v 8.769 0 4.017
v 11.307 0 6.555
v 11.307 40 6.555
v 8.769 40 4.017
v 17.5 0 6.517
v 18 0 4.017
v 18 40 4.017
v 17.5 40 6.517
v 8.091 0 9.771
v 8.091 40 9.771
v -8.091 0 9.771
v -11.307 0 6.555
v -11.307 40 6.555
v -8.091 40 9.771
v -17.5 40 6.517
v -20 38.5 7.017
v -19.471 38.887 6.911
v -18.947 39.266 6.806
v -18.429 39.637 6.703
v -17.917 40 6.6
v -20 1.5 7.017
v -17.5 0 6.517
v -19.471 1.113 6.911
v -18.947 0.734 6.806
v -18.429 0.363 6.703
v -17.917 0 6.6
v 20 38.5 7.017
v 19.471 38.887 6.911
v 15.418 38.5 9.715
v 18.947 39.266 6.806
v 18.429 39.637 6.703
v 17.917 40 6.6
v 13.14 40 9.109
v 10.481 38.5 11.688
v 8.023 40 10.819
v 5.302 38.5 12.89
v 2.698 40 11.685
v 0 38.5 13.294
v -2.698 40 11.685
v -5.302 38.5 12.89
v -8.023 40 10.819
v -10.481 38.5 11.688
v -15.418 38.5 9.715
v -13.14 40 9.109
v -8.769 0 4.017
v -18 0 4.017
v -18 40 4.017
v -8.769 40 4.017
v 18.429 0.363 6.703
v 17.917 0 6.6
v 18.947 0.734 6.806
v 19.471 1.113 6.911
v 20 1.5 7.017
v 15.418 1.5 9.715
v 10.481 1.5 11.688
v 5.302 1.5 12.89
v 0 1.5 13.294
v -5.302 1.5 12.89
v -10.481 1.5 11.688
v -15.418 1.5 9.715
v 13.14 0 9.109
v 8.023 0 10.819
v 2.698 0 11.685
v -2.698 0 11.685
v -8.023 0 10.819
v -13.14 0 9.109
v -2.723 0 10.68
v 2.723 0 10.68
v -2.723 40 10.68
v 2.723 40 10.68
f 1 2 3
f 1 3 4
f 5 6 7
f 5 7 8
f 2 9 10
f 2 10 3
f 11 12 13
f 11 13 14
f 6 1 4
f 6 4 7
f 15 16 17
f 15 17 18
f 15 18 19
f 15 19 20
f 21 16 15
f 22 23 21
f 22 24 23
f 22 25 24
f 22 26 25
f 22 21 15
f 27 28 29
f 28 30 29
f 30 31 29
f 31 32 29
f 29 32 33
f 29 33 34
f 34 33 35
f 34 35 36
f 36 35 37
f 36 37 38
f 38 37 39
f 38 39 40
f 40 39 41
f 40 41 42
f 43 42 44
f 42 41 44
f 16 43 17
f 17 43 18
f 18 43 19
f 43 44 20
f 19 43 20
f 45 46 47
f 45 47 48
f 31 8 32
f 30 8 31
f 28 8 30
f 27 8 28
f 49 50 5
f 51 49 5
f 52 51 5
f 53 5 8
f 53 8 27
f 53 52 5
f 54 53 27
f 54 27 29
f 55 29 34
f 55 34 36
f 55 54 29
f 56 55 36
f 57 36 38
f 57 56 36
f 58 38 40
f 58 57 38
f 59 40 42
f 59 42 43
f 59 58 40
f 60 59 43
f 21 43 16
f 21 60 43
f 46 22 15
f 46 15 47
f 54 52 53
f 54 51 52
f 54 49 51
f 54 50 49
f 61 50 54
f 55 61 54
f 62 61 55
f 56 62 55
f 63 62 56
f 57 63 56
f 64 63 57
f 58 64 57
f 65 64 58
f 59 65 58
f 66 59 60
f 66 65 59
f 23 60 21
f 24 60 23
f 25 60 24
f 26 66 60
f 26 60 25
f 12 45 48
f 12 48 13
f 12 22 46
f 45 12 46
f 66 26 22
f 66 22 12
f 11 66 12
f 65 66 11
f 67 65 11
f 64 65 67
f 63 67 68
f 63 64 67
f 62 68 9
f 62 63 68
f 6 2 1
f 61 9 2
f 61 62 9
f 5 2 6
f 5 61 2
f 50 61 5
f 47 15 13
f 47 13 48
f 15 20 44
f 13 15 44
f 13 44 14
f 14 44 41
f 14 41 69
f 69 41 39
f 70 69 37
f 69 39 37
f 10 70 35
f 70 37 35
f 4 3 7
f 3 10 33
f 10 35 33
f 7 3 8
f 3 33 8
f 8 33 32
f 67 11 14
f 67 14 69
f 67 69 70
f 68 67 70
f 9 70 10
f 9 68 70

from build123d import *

# Parameters (mm, degrees)
F1_DEPTH = 40
F2_SIZE  = 1.5


with BuildPart() as f1:
    # F0 (on Front) → F1 (new body)
    with BuildSketch(Plane.XZ):
        with BuildLine():
            Line((11.307107, 6.555), (8.768918, 4.016812))
            Line((8.768918, 4.016812), (18, 4.016812))
            Line((18, 4.016812), (17.5, 6.516812))
            Line((17.5, 6.516812), (20, 7.016812))
            ThreePointArc((20, 7.016812), (0, 13.293998), (-20, 7.016812))
            Line((-20, 7.016812), (-17.5, 6.516812))
            Line((-17.5, 6.516812), (-18, 4.016812))
            Line((-18, 4.016812), (-8.768918, 4.016812))
            Line((-8.768918, 4.016812), (-11.307107, 6.555))
            Line((-11.307107, 6.555), (-8.091484, 9.770623))
            ThreePointArc((-8.091484, 9.770623), (0, 10.793998), (8.091484, 9.770623))
            Line((8.091484, 9.770623), (11.307107, 6.555))
        make_face()
    extrude(amount=-F1_DEPTH)

    # F2
    f2_edges = [f1.edges().sort_by_distance(p)[0] for p in [
        (0, 0, 13.293998),
        (0, 40, 13.293998),
    ]]
    chamfer(f2_edges, length=F2_SIZE)


solid = f1.part
